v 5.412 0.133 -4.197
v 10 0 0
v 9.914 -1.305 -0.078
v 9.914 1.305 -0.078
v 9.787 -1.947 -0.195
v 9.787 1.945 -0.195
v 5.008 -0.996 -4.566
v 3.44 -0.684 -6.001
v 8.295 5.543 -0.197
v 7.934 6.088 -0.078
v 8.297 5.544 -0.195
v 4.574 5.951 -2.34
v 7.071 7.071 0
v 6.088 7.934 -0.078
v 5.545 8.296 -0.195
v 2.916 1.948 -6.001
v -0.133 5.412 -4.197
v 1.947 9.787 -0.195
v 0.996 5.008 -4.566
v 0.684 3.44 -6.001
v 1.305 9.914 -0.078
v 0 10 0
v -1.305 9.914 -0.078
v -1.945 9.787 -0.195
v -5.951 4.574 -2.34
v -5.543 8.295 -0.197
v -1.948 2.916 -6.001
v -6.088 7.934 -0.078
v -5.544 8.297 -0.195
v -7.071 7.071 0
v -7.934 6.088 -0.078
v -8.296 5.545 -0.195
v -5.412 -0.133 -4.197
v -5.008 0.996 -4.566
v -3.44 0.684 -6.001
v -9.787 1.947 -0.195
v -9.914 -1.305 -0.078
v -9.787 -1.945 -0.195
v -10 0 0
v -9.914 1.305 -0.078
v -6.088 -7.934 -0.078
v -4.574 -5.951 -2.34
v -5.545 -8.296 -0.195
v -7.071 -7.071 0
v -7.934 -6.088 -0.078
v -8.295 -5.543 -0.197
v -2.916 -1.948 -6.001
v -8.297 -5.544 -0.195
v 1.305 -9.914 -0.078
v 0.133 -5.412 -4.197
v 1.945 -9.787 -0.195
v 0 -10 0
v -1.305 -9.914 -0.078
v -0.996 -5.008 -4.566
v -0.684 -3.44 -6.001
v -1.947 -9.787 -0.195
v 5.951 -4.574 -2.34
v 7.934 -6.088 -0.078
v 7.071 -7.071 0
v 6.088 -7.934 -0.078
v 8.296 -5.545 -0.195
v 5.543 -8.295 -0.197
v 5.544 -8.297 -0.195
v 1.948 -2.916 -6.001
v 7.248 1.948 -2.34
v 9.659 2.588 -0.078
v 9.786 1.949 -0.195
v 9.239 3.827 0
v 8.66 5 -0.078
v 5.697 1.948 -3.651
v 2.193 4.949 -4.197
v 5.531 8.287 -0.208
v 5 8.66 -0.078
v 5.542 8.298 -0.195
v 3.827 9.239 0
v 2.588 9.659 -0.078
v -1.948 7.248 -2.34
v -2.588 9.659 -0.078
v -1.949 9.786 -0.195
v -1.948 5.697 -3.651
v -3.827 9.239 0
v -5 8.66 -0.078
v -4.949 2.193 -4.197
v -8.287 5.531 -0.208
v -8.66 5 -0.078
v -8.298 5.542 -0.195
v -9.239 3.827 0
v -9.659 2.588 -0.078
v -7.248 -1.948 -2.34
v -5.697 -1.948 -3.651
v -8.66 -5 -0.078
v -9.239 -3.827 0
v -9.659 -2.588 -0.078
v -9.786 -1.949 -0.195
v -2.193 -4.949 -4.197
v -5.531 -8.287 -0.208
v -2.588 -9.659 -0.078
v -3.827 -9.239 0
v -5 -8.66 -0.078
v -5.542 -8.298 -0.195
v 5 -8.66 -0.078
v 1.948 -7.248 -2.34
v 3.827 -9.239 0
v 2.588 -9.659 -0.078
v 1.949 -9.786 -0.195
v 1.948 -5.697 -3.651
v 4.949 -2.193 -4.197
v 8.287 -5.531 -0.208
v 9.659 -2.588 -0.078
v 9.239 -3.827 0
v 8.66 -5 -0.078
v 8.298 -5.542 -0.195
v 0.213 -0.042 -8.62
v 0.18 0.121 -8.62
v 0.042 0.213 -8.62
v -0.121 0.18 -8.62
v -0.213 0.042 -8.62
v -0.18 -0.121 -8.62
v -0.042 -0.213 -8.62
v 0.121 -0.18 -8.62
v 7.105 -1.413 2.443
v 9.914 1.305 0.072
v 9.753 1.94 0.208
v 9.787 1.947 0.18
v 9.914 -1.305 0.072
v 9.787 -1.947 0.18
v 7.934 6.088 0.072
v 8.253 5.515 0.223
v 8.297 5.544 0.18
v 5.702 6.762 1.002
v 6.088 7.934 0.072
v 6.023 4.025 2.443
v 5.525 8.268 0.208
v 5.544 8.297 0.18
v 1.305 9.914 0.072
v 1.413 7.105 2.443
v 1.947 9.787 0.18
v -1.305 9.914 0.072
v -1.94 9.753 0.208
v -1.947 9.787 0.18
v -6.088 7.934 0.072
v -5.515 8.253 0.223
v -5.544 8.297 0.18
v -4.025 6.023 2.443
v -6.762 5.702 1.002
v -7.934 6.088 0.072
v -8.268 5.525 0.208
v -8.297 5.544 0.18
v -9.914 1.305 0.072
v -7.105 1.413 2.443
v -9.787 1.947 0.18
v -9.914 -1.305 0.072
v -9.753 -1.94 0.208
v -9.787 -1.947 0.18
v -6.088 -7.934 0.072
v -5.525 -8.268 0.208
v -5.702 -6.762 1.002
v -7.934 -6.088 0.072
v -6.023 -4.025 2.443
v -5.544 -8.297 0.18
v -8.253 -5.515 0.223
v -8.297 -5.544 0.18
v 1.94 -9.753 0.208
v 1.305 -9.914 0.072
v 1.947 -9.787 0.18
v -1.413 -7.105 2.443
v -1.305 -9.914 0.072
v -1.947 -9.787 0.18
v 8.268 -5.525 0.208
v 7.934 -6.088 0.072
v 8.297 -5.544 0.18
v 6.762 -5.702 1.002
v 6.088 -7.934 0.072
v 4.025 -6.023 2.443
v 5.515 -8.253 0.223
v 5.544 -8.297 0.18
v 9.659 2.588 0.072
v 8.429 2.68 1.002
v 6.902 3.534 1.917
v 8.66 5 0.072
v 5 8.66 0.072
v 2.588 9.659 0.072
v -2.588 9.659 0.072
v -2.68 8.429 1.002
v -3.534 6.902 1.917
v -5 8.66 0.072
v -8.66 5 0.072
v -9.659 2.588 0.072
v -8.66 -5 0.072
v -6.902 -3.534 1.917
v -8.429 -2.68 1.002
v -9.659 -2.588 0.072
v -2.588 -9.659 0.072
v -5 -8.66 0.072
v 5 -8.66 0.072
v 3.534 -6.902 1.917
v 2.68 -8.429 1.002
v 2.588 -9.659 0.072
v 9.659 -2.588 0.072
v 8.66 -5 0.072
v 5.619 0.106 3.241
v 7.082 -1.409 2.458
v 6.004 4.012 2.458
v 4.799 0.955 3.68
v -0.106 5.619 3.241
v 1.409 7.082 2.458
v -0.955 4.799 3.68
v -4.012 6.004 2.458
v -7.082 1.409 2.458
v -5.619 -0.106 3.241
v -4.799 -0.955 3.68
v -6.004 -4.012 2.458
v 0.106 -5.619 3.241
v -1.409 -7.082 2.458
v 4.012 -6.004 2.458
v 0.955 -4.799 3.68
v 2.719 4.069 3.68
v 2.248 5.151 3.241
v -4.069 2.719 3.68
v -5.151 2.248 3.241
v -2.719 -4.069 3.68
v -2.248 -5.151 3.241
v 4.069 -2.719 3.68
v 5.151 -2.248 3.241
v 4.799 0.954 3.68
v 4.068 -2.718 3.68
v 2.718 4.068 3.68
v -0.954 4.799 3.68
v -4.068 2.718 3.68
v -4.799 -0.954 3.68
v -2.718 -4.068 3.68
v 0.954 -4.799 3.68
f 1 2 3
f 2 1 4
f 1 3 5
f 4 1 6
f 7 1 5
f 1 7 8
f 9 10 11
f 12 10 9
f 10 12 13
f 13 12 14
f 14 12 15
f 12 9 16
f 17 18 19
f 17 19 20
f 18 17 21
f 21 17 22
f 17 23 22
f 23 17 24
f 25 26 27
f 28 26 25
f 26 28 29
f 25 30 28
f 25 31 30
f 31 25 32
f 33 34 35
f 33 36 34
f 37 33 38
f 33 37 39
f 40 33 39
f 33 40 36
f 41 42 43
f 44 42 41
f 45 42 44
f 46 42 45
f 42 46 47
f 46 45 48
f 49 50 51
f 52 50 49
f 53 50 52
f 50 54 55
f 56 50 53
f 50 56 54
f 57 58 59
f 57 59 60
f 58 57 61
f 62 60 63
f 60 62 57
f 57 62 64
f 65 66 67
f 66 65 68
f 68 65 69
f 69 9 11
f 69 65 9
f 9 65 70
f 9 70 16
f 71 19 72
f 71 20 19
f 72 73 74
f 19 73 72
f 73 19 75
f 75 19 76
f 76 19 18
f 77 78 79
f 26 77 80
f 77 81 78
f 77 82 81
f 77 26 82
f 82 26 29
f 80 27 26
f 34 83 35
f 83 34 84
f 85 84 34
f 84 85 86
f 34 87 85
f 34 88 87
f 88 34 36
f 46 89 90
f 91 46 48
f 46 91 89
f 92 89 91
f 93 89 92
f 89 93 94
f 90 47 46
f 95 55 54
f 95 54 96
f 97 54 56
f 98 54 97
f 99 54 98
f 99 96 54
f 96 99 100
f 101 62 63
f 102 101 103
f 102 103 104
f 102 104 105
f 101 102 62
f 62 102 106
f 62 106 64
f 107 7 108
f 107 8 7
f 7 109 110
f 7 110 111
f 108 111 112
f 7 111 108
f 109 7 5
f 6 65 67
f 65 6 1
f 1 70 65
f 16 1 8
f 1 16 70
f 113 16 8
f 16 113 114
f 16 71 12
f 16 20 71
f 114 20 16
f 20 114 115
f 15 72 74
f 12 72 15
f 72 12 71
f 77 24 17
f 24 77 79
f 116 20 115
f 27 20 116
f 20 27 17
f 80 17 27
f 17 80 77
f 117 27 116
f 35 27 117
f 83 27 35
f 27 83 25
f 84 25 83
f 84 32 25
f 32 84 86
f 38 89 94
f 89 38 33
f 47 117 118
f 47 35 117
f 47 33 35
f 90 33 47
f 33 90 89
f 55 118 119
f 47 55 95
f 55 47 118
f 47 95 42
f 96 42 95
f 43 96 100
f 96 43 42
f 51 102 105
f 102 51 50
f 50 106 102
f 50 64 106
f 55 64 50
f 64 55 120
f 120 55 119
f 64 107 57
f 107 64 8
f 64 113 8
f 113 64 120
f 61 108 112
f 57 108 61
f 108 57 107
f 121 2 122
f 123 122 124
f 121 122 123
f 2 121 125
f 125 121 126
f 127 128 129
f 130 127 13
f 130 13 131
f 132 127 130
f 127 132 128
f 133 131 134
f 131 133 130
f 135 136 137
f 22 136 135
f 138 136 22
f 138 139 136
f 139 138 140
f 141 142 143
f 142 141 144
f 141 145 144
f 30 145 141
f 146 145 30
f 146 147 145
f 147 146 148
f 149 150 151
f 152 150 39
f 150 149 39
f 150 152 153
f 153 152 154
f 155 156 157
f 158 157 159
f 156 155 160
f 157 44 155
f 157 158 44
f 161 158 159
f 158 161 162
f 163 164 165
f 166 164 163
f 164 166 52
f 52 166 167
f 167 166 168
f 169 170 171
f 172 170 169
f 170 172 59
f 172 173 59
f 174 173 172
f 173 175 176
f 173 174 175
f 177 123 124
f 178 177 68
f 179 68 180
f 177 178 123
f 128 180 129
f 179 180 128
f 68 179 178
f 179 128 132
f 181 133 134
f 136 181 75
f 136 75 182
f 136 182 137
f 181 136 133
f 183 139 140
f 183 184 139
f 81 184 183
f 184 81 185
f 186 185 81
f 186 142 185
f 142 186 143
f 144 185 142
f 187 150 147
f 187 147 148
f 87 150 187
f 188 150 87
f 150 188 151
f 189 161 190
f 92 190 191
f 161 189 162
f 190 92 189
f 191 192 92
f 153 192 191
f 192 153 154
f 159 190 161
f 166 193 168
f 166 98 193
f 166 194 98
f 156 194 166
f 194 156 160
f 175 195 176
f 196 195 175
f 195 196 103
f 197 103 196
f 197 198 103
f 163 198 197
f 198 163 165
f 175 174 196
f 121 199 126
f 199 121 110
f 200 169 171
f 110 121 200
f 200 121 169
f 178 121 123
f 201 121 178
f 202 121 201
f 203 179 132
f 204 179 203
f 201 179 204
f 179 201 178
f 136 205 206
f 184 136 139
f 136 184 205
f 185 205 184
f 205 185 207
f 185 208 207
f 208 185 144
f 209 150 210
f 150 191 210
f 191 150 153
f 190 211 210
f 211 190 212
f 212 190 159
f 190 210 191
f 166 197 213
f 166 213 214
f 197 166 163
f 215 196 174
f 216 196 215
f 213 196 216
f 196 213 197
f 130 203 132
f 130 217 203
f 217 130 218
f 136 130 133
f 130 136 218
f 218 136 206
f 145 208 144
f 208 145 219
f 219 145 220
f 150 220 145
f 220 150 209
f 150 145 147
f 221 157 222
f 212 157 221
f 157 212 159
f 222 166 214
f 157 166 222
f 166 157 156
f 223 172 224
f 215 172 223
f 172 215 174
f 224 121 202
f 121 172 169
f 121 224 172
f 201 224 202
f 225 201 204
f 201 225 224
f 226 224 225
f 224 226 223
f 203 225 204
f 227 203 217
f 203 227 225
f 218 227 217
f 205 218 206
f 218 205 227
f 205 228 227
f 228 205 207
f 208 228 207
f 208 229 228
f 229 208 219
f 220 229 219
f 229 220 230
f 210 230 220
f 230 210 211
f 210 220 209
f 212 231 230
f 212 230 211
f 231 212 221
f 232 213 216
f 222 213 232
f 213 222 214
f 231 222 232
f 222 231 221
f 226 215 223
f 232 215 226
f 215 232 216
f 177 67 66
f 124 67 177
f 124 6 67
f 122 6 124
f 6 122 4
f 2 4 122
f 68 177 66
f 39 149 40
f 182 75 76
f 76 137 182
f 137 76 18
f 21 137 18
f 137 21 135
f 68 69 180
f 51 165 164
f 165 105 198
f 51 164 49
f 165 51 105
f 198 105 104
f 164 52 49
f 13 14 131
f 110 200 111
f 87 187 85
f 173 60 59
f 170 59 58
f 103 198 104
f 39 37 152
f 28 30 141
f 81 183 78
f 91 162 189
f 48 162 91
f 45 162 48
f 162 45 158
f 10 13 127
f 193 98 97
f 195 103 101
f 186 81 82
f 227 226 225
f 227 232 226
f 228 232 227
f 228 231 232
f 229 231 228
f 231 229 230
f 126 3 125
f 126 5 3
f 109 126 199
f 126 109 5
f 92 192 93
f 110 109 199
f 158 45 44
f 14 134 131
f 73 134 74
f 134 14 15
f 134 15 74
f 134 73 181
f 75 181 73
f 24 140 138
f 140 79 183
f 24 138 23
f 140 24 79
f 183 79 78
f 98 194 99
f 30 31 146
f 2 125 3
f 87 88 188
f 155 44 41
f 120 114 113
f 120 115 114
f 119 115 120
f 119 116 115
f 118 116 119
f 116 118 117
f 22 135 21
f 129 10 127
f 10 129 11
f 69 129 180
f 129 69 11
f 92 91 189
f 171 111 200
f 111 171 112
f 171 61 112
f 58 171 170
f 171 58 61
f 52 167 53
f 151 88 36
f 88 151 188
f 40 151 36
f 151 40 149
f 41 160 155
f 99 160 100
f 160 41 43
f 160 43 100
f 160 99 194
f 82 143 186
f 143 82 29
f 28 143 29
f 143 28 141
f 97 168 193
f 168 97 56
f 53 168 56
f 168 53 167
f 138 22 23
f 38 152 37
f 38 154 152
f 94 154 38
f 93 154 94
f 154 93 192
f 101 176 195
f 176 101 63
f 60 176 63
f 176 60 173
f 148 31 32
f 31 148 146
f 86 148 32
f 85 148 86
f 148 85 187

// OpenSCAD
module sea_urchin()
difine();
//valiable data

//Diamond_size_d
dd=20;//[10:40]

//Diamond_hight_retio
hr=0.615;

// ignore variable values
pag1=42.45*1;//Pavillion_angle1
pag2=40.75*1;////Pavillion_angle2
cag3=40.16*1;////Crown_angle3
cag4=34.5*1;////Crown_angle4
cag5=24.35*1;////Crown_angle4
dh=dd*hr;//Diamond_hight_retio

difference() {
			translate([0,0,-dd*0.431])cylinder(h=dh,r=dd/2,$fn=48);	
union(){
	for (i = [ 0 : 8-1] ) {
				rotate([0,0,360/8*i]) translate([dd/2,0,-5/cos(pag1)]) rotate([0,90-pag1,0])cube(size=[dd/2,dd/2,1.1*dd], center=true);
							}
for (i = [ 0 : 8-1] ) {
				rotate([0,0,360/8*i+22.5]) translate([dd/2,0,-5/cos(pag1)]) rotate([0,90-pag1,0])cube(size=[dd/2,dd/2,1.1*dd], center=true);
							}
	for (i = [ 0 : 8-1] ) {
				rotate([0,0,360/8*i+11.25]) translate([dd/2,0,-5/cos(pag1)]) rotate([0,90-pag2,0])cube(size=[dd/2,dd/2,dd], center=true);
							}
}
union(){
	for (i = [ 0 : 8-1] ) {
		rotate([0,0,360/8*i]) translate([dd/2,0,5/cos(cag3)]) rotate([0,90-cag3,180])cube(size=[dd/2,dd/2,dd], center=true);
							}
for (i = [ 0 : 8-1] ) {
		rotate([0,0,360/8*i+22.5]) translate([dd/2,0,5/cos(cag3)]) rotate([0,90-cag3,180])cube(size=[dd/2,dd/2,dd], center=true);
							}
}
union(){
	for (i = [ 0 : 4-1] ) {
		rotate([0,0,360/4*i+11.25]) translate([dd/2,0,5/cos(cag4)+0.0085*dd]) rotate([0,90-cag4,180])cube(size=[dd/2,dd/2,dd], center=true);
							}
for (i = [ 0 : 4-1] ) {
		rotate([0,0,360/4*i+11.25+45]) translate([dd/2,0,5/cos(cag4)+0.0085*dd]) rotate([0,90-cag4,180])cube(size=[dd/2,dd/2,dd], center=true);
							}
	for (i = [ 0 : 8-1] ) {
	rotate([0,0,360/8*i-11.25]) translate([dd/2,0,5/cos(cag5)+0.060*dd]) rotate([0,90-cag5,180])cube(size=[dd/2,dd/2,dd], center=true);
							}
		}
			}
module sea_urchin();



	
